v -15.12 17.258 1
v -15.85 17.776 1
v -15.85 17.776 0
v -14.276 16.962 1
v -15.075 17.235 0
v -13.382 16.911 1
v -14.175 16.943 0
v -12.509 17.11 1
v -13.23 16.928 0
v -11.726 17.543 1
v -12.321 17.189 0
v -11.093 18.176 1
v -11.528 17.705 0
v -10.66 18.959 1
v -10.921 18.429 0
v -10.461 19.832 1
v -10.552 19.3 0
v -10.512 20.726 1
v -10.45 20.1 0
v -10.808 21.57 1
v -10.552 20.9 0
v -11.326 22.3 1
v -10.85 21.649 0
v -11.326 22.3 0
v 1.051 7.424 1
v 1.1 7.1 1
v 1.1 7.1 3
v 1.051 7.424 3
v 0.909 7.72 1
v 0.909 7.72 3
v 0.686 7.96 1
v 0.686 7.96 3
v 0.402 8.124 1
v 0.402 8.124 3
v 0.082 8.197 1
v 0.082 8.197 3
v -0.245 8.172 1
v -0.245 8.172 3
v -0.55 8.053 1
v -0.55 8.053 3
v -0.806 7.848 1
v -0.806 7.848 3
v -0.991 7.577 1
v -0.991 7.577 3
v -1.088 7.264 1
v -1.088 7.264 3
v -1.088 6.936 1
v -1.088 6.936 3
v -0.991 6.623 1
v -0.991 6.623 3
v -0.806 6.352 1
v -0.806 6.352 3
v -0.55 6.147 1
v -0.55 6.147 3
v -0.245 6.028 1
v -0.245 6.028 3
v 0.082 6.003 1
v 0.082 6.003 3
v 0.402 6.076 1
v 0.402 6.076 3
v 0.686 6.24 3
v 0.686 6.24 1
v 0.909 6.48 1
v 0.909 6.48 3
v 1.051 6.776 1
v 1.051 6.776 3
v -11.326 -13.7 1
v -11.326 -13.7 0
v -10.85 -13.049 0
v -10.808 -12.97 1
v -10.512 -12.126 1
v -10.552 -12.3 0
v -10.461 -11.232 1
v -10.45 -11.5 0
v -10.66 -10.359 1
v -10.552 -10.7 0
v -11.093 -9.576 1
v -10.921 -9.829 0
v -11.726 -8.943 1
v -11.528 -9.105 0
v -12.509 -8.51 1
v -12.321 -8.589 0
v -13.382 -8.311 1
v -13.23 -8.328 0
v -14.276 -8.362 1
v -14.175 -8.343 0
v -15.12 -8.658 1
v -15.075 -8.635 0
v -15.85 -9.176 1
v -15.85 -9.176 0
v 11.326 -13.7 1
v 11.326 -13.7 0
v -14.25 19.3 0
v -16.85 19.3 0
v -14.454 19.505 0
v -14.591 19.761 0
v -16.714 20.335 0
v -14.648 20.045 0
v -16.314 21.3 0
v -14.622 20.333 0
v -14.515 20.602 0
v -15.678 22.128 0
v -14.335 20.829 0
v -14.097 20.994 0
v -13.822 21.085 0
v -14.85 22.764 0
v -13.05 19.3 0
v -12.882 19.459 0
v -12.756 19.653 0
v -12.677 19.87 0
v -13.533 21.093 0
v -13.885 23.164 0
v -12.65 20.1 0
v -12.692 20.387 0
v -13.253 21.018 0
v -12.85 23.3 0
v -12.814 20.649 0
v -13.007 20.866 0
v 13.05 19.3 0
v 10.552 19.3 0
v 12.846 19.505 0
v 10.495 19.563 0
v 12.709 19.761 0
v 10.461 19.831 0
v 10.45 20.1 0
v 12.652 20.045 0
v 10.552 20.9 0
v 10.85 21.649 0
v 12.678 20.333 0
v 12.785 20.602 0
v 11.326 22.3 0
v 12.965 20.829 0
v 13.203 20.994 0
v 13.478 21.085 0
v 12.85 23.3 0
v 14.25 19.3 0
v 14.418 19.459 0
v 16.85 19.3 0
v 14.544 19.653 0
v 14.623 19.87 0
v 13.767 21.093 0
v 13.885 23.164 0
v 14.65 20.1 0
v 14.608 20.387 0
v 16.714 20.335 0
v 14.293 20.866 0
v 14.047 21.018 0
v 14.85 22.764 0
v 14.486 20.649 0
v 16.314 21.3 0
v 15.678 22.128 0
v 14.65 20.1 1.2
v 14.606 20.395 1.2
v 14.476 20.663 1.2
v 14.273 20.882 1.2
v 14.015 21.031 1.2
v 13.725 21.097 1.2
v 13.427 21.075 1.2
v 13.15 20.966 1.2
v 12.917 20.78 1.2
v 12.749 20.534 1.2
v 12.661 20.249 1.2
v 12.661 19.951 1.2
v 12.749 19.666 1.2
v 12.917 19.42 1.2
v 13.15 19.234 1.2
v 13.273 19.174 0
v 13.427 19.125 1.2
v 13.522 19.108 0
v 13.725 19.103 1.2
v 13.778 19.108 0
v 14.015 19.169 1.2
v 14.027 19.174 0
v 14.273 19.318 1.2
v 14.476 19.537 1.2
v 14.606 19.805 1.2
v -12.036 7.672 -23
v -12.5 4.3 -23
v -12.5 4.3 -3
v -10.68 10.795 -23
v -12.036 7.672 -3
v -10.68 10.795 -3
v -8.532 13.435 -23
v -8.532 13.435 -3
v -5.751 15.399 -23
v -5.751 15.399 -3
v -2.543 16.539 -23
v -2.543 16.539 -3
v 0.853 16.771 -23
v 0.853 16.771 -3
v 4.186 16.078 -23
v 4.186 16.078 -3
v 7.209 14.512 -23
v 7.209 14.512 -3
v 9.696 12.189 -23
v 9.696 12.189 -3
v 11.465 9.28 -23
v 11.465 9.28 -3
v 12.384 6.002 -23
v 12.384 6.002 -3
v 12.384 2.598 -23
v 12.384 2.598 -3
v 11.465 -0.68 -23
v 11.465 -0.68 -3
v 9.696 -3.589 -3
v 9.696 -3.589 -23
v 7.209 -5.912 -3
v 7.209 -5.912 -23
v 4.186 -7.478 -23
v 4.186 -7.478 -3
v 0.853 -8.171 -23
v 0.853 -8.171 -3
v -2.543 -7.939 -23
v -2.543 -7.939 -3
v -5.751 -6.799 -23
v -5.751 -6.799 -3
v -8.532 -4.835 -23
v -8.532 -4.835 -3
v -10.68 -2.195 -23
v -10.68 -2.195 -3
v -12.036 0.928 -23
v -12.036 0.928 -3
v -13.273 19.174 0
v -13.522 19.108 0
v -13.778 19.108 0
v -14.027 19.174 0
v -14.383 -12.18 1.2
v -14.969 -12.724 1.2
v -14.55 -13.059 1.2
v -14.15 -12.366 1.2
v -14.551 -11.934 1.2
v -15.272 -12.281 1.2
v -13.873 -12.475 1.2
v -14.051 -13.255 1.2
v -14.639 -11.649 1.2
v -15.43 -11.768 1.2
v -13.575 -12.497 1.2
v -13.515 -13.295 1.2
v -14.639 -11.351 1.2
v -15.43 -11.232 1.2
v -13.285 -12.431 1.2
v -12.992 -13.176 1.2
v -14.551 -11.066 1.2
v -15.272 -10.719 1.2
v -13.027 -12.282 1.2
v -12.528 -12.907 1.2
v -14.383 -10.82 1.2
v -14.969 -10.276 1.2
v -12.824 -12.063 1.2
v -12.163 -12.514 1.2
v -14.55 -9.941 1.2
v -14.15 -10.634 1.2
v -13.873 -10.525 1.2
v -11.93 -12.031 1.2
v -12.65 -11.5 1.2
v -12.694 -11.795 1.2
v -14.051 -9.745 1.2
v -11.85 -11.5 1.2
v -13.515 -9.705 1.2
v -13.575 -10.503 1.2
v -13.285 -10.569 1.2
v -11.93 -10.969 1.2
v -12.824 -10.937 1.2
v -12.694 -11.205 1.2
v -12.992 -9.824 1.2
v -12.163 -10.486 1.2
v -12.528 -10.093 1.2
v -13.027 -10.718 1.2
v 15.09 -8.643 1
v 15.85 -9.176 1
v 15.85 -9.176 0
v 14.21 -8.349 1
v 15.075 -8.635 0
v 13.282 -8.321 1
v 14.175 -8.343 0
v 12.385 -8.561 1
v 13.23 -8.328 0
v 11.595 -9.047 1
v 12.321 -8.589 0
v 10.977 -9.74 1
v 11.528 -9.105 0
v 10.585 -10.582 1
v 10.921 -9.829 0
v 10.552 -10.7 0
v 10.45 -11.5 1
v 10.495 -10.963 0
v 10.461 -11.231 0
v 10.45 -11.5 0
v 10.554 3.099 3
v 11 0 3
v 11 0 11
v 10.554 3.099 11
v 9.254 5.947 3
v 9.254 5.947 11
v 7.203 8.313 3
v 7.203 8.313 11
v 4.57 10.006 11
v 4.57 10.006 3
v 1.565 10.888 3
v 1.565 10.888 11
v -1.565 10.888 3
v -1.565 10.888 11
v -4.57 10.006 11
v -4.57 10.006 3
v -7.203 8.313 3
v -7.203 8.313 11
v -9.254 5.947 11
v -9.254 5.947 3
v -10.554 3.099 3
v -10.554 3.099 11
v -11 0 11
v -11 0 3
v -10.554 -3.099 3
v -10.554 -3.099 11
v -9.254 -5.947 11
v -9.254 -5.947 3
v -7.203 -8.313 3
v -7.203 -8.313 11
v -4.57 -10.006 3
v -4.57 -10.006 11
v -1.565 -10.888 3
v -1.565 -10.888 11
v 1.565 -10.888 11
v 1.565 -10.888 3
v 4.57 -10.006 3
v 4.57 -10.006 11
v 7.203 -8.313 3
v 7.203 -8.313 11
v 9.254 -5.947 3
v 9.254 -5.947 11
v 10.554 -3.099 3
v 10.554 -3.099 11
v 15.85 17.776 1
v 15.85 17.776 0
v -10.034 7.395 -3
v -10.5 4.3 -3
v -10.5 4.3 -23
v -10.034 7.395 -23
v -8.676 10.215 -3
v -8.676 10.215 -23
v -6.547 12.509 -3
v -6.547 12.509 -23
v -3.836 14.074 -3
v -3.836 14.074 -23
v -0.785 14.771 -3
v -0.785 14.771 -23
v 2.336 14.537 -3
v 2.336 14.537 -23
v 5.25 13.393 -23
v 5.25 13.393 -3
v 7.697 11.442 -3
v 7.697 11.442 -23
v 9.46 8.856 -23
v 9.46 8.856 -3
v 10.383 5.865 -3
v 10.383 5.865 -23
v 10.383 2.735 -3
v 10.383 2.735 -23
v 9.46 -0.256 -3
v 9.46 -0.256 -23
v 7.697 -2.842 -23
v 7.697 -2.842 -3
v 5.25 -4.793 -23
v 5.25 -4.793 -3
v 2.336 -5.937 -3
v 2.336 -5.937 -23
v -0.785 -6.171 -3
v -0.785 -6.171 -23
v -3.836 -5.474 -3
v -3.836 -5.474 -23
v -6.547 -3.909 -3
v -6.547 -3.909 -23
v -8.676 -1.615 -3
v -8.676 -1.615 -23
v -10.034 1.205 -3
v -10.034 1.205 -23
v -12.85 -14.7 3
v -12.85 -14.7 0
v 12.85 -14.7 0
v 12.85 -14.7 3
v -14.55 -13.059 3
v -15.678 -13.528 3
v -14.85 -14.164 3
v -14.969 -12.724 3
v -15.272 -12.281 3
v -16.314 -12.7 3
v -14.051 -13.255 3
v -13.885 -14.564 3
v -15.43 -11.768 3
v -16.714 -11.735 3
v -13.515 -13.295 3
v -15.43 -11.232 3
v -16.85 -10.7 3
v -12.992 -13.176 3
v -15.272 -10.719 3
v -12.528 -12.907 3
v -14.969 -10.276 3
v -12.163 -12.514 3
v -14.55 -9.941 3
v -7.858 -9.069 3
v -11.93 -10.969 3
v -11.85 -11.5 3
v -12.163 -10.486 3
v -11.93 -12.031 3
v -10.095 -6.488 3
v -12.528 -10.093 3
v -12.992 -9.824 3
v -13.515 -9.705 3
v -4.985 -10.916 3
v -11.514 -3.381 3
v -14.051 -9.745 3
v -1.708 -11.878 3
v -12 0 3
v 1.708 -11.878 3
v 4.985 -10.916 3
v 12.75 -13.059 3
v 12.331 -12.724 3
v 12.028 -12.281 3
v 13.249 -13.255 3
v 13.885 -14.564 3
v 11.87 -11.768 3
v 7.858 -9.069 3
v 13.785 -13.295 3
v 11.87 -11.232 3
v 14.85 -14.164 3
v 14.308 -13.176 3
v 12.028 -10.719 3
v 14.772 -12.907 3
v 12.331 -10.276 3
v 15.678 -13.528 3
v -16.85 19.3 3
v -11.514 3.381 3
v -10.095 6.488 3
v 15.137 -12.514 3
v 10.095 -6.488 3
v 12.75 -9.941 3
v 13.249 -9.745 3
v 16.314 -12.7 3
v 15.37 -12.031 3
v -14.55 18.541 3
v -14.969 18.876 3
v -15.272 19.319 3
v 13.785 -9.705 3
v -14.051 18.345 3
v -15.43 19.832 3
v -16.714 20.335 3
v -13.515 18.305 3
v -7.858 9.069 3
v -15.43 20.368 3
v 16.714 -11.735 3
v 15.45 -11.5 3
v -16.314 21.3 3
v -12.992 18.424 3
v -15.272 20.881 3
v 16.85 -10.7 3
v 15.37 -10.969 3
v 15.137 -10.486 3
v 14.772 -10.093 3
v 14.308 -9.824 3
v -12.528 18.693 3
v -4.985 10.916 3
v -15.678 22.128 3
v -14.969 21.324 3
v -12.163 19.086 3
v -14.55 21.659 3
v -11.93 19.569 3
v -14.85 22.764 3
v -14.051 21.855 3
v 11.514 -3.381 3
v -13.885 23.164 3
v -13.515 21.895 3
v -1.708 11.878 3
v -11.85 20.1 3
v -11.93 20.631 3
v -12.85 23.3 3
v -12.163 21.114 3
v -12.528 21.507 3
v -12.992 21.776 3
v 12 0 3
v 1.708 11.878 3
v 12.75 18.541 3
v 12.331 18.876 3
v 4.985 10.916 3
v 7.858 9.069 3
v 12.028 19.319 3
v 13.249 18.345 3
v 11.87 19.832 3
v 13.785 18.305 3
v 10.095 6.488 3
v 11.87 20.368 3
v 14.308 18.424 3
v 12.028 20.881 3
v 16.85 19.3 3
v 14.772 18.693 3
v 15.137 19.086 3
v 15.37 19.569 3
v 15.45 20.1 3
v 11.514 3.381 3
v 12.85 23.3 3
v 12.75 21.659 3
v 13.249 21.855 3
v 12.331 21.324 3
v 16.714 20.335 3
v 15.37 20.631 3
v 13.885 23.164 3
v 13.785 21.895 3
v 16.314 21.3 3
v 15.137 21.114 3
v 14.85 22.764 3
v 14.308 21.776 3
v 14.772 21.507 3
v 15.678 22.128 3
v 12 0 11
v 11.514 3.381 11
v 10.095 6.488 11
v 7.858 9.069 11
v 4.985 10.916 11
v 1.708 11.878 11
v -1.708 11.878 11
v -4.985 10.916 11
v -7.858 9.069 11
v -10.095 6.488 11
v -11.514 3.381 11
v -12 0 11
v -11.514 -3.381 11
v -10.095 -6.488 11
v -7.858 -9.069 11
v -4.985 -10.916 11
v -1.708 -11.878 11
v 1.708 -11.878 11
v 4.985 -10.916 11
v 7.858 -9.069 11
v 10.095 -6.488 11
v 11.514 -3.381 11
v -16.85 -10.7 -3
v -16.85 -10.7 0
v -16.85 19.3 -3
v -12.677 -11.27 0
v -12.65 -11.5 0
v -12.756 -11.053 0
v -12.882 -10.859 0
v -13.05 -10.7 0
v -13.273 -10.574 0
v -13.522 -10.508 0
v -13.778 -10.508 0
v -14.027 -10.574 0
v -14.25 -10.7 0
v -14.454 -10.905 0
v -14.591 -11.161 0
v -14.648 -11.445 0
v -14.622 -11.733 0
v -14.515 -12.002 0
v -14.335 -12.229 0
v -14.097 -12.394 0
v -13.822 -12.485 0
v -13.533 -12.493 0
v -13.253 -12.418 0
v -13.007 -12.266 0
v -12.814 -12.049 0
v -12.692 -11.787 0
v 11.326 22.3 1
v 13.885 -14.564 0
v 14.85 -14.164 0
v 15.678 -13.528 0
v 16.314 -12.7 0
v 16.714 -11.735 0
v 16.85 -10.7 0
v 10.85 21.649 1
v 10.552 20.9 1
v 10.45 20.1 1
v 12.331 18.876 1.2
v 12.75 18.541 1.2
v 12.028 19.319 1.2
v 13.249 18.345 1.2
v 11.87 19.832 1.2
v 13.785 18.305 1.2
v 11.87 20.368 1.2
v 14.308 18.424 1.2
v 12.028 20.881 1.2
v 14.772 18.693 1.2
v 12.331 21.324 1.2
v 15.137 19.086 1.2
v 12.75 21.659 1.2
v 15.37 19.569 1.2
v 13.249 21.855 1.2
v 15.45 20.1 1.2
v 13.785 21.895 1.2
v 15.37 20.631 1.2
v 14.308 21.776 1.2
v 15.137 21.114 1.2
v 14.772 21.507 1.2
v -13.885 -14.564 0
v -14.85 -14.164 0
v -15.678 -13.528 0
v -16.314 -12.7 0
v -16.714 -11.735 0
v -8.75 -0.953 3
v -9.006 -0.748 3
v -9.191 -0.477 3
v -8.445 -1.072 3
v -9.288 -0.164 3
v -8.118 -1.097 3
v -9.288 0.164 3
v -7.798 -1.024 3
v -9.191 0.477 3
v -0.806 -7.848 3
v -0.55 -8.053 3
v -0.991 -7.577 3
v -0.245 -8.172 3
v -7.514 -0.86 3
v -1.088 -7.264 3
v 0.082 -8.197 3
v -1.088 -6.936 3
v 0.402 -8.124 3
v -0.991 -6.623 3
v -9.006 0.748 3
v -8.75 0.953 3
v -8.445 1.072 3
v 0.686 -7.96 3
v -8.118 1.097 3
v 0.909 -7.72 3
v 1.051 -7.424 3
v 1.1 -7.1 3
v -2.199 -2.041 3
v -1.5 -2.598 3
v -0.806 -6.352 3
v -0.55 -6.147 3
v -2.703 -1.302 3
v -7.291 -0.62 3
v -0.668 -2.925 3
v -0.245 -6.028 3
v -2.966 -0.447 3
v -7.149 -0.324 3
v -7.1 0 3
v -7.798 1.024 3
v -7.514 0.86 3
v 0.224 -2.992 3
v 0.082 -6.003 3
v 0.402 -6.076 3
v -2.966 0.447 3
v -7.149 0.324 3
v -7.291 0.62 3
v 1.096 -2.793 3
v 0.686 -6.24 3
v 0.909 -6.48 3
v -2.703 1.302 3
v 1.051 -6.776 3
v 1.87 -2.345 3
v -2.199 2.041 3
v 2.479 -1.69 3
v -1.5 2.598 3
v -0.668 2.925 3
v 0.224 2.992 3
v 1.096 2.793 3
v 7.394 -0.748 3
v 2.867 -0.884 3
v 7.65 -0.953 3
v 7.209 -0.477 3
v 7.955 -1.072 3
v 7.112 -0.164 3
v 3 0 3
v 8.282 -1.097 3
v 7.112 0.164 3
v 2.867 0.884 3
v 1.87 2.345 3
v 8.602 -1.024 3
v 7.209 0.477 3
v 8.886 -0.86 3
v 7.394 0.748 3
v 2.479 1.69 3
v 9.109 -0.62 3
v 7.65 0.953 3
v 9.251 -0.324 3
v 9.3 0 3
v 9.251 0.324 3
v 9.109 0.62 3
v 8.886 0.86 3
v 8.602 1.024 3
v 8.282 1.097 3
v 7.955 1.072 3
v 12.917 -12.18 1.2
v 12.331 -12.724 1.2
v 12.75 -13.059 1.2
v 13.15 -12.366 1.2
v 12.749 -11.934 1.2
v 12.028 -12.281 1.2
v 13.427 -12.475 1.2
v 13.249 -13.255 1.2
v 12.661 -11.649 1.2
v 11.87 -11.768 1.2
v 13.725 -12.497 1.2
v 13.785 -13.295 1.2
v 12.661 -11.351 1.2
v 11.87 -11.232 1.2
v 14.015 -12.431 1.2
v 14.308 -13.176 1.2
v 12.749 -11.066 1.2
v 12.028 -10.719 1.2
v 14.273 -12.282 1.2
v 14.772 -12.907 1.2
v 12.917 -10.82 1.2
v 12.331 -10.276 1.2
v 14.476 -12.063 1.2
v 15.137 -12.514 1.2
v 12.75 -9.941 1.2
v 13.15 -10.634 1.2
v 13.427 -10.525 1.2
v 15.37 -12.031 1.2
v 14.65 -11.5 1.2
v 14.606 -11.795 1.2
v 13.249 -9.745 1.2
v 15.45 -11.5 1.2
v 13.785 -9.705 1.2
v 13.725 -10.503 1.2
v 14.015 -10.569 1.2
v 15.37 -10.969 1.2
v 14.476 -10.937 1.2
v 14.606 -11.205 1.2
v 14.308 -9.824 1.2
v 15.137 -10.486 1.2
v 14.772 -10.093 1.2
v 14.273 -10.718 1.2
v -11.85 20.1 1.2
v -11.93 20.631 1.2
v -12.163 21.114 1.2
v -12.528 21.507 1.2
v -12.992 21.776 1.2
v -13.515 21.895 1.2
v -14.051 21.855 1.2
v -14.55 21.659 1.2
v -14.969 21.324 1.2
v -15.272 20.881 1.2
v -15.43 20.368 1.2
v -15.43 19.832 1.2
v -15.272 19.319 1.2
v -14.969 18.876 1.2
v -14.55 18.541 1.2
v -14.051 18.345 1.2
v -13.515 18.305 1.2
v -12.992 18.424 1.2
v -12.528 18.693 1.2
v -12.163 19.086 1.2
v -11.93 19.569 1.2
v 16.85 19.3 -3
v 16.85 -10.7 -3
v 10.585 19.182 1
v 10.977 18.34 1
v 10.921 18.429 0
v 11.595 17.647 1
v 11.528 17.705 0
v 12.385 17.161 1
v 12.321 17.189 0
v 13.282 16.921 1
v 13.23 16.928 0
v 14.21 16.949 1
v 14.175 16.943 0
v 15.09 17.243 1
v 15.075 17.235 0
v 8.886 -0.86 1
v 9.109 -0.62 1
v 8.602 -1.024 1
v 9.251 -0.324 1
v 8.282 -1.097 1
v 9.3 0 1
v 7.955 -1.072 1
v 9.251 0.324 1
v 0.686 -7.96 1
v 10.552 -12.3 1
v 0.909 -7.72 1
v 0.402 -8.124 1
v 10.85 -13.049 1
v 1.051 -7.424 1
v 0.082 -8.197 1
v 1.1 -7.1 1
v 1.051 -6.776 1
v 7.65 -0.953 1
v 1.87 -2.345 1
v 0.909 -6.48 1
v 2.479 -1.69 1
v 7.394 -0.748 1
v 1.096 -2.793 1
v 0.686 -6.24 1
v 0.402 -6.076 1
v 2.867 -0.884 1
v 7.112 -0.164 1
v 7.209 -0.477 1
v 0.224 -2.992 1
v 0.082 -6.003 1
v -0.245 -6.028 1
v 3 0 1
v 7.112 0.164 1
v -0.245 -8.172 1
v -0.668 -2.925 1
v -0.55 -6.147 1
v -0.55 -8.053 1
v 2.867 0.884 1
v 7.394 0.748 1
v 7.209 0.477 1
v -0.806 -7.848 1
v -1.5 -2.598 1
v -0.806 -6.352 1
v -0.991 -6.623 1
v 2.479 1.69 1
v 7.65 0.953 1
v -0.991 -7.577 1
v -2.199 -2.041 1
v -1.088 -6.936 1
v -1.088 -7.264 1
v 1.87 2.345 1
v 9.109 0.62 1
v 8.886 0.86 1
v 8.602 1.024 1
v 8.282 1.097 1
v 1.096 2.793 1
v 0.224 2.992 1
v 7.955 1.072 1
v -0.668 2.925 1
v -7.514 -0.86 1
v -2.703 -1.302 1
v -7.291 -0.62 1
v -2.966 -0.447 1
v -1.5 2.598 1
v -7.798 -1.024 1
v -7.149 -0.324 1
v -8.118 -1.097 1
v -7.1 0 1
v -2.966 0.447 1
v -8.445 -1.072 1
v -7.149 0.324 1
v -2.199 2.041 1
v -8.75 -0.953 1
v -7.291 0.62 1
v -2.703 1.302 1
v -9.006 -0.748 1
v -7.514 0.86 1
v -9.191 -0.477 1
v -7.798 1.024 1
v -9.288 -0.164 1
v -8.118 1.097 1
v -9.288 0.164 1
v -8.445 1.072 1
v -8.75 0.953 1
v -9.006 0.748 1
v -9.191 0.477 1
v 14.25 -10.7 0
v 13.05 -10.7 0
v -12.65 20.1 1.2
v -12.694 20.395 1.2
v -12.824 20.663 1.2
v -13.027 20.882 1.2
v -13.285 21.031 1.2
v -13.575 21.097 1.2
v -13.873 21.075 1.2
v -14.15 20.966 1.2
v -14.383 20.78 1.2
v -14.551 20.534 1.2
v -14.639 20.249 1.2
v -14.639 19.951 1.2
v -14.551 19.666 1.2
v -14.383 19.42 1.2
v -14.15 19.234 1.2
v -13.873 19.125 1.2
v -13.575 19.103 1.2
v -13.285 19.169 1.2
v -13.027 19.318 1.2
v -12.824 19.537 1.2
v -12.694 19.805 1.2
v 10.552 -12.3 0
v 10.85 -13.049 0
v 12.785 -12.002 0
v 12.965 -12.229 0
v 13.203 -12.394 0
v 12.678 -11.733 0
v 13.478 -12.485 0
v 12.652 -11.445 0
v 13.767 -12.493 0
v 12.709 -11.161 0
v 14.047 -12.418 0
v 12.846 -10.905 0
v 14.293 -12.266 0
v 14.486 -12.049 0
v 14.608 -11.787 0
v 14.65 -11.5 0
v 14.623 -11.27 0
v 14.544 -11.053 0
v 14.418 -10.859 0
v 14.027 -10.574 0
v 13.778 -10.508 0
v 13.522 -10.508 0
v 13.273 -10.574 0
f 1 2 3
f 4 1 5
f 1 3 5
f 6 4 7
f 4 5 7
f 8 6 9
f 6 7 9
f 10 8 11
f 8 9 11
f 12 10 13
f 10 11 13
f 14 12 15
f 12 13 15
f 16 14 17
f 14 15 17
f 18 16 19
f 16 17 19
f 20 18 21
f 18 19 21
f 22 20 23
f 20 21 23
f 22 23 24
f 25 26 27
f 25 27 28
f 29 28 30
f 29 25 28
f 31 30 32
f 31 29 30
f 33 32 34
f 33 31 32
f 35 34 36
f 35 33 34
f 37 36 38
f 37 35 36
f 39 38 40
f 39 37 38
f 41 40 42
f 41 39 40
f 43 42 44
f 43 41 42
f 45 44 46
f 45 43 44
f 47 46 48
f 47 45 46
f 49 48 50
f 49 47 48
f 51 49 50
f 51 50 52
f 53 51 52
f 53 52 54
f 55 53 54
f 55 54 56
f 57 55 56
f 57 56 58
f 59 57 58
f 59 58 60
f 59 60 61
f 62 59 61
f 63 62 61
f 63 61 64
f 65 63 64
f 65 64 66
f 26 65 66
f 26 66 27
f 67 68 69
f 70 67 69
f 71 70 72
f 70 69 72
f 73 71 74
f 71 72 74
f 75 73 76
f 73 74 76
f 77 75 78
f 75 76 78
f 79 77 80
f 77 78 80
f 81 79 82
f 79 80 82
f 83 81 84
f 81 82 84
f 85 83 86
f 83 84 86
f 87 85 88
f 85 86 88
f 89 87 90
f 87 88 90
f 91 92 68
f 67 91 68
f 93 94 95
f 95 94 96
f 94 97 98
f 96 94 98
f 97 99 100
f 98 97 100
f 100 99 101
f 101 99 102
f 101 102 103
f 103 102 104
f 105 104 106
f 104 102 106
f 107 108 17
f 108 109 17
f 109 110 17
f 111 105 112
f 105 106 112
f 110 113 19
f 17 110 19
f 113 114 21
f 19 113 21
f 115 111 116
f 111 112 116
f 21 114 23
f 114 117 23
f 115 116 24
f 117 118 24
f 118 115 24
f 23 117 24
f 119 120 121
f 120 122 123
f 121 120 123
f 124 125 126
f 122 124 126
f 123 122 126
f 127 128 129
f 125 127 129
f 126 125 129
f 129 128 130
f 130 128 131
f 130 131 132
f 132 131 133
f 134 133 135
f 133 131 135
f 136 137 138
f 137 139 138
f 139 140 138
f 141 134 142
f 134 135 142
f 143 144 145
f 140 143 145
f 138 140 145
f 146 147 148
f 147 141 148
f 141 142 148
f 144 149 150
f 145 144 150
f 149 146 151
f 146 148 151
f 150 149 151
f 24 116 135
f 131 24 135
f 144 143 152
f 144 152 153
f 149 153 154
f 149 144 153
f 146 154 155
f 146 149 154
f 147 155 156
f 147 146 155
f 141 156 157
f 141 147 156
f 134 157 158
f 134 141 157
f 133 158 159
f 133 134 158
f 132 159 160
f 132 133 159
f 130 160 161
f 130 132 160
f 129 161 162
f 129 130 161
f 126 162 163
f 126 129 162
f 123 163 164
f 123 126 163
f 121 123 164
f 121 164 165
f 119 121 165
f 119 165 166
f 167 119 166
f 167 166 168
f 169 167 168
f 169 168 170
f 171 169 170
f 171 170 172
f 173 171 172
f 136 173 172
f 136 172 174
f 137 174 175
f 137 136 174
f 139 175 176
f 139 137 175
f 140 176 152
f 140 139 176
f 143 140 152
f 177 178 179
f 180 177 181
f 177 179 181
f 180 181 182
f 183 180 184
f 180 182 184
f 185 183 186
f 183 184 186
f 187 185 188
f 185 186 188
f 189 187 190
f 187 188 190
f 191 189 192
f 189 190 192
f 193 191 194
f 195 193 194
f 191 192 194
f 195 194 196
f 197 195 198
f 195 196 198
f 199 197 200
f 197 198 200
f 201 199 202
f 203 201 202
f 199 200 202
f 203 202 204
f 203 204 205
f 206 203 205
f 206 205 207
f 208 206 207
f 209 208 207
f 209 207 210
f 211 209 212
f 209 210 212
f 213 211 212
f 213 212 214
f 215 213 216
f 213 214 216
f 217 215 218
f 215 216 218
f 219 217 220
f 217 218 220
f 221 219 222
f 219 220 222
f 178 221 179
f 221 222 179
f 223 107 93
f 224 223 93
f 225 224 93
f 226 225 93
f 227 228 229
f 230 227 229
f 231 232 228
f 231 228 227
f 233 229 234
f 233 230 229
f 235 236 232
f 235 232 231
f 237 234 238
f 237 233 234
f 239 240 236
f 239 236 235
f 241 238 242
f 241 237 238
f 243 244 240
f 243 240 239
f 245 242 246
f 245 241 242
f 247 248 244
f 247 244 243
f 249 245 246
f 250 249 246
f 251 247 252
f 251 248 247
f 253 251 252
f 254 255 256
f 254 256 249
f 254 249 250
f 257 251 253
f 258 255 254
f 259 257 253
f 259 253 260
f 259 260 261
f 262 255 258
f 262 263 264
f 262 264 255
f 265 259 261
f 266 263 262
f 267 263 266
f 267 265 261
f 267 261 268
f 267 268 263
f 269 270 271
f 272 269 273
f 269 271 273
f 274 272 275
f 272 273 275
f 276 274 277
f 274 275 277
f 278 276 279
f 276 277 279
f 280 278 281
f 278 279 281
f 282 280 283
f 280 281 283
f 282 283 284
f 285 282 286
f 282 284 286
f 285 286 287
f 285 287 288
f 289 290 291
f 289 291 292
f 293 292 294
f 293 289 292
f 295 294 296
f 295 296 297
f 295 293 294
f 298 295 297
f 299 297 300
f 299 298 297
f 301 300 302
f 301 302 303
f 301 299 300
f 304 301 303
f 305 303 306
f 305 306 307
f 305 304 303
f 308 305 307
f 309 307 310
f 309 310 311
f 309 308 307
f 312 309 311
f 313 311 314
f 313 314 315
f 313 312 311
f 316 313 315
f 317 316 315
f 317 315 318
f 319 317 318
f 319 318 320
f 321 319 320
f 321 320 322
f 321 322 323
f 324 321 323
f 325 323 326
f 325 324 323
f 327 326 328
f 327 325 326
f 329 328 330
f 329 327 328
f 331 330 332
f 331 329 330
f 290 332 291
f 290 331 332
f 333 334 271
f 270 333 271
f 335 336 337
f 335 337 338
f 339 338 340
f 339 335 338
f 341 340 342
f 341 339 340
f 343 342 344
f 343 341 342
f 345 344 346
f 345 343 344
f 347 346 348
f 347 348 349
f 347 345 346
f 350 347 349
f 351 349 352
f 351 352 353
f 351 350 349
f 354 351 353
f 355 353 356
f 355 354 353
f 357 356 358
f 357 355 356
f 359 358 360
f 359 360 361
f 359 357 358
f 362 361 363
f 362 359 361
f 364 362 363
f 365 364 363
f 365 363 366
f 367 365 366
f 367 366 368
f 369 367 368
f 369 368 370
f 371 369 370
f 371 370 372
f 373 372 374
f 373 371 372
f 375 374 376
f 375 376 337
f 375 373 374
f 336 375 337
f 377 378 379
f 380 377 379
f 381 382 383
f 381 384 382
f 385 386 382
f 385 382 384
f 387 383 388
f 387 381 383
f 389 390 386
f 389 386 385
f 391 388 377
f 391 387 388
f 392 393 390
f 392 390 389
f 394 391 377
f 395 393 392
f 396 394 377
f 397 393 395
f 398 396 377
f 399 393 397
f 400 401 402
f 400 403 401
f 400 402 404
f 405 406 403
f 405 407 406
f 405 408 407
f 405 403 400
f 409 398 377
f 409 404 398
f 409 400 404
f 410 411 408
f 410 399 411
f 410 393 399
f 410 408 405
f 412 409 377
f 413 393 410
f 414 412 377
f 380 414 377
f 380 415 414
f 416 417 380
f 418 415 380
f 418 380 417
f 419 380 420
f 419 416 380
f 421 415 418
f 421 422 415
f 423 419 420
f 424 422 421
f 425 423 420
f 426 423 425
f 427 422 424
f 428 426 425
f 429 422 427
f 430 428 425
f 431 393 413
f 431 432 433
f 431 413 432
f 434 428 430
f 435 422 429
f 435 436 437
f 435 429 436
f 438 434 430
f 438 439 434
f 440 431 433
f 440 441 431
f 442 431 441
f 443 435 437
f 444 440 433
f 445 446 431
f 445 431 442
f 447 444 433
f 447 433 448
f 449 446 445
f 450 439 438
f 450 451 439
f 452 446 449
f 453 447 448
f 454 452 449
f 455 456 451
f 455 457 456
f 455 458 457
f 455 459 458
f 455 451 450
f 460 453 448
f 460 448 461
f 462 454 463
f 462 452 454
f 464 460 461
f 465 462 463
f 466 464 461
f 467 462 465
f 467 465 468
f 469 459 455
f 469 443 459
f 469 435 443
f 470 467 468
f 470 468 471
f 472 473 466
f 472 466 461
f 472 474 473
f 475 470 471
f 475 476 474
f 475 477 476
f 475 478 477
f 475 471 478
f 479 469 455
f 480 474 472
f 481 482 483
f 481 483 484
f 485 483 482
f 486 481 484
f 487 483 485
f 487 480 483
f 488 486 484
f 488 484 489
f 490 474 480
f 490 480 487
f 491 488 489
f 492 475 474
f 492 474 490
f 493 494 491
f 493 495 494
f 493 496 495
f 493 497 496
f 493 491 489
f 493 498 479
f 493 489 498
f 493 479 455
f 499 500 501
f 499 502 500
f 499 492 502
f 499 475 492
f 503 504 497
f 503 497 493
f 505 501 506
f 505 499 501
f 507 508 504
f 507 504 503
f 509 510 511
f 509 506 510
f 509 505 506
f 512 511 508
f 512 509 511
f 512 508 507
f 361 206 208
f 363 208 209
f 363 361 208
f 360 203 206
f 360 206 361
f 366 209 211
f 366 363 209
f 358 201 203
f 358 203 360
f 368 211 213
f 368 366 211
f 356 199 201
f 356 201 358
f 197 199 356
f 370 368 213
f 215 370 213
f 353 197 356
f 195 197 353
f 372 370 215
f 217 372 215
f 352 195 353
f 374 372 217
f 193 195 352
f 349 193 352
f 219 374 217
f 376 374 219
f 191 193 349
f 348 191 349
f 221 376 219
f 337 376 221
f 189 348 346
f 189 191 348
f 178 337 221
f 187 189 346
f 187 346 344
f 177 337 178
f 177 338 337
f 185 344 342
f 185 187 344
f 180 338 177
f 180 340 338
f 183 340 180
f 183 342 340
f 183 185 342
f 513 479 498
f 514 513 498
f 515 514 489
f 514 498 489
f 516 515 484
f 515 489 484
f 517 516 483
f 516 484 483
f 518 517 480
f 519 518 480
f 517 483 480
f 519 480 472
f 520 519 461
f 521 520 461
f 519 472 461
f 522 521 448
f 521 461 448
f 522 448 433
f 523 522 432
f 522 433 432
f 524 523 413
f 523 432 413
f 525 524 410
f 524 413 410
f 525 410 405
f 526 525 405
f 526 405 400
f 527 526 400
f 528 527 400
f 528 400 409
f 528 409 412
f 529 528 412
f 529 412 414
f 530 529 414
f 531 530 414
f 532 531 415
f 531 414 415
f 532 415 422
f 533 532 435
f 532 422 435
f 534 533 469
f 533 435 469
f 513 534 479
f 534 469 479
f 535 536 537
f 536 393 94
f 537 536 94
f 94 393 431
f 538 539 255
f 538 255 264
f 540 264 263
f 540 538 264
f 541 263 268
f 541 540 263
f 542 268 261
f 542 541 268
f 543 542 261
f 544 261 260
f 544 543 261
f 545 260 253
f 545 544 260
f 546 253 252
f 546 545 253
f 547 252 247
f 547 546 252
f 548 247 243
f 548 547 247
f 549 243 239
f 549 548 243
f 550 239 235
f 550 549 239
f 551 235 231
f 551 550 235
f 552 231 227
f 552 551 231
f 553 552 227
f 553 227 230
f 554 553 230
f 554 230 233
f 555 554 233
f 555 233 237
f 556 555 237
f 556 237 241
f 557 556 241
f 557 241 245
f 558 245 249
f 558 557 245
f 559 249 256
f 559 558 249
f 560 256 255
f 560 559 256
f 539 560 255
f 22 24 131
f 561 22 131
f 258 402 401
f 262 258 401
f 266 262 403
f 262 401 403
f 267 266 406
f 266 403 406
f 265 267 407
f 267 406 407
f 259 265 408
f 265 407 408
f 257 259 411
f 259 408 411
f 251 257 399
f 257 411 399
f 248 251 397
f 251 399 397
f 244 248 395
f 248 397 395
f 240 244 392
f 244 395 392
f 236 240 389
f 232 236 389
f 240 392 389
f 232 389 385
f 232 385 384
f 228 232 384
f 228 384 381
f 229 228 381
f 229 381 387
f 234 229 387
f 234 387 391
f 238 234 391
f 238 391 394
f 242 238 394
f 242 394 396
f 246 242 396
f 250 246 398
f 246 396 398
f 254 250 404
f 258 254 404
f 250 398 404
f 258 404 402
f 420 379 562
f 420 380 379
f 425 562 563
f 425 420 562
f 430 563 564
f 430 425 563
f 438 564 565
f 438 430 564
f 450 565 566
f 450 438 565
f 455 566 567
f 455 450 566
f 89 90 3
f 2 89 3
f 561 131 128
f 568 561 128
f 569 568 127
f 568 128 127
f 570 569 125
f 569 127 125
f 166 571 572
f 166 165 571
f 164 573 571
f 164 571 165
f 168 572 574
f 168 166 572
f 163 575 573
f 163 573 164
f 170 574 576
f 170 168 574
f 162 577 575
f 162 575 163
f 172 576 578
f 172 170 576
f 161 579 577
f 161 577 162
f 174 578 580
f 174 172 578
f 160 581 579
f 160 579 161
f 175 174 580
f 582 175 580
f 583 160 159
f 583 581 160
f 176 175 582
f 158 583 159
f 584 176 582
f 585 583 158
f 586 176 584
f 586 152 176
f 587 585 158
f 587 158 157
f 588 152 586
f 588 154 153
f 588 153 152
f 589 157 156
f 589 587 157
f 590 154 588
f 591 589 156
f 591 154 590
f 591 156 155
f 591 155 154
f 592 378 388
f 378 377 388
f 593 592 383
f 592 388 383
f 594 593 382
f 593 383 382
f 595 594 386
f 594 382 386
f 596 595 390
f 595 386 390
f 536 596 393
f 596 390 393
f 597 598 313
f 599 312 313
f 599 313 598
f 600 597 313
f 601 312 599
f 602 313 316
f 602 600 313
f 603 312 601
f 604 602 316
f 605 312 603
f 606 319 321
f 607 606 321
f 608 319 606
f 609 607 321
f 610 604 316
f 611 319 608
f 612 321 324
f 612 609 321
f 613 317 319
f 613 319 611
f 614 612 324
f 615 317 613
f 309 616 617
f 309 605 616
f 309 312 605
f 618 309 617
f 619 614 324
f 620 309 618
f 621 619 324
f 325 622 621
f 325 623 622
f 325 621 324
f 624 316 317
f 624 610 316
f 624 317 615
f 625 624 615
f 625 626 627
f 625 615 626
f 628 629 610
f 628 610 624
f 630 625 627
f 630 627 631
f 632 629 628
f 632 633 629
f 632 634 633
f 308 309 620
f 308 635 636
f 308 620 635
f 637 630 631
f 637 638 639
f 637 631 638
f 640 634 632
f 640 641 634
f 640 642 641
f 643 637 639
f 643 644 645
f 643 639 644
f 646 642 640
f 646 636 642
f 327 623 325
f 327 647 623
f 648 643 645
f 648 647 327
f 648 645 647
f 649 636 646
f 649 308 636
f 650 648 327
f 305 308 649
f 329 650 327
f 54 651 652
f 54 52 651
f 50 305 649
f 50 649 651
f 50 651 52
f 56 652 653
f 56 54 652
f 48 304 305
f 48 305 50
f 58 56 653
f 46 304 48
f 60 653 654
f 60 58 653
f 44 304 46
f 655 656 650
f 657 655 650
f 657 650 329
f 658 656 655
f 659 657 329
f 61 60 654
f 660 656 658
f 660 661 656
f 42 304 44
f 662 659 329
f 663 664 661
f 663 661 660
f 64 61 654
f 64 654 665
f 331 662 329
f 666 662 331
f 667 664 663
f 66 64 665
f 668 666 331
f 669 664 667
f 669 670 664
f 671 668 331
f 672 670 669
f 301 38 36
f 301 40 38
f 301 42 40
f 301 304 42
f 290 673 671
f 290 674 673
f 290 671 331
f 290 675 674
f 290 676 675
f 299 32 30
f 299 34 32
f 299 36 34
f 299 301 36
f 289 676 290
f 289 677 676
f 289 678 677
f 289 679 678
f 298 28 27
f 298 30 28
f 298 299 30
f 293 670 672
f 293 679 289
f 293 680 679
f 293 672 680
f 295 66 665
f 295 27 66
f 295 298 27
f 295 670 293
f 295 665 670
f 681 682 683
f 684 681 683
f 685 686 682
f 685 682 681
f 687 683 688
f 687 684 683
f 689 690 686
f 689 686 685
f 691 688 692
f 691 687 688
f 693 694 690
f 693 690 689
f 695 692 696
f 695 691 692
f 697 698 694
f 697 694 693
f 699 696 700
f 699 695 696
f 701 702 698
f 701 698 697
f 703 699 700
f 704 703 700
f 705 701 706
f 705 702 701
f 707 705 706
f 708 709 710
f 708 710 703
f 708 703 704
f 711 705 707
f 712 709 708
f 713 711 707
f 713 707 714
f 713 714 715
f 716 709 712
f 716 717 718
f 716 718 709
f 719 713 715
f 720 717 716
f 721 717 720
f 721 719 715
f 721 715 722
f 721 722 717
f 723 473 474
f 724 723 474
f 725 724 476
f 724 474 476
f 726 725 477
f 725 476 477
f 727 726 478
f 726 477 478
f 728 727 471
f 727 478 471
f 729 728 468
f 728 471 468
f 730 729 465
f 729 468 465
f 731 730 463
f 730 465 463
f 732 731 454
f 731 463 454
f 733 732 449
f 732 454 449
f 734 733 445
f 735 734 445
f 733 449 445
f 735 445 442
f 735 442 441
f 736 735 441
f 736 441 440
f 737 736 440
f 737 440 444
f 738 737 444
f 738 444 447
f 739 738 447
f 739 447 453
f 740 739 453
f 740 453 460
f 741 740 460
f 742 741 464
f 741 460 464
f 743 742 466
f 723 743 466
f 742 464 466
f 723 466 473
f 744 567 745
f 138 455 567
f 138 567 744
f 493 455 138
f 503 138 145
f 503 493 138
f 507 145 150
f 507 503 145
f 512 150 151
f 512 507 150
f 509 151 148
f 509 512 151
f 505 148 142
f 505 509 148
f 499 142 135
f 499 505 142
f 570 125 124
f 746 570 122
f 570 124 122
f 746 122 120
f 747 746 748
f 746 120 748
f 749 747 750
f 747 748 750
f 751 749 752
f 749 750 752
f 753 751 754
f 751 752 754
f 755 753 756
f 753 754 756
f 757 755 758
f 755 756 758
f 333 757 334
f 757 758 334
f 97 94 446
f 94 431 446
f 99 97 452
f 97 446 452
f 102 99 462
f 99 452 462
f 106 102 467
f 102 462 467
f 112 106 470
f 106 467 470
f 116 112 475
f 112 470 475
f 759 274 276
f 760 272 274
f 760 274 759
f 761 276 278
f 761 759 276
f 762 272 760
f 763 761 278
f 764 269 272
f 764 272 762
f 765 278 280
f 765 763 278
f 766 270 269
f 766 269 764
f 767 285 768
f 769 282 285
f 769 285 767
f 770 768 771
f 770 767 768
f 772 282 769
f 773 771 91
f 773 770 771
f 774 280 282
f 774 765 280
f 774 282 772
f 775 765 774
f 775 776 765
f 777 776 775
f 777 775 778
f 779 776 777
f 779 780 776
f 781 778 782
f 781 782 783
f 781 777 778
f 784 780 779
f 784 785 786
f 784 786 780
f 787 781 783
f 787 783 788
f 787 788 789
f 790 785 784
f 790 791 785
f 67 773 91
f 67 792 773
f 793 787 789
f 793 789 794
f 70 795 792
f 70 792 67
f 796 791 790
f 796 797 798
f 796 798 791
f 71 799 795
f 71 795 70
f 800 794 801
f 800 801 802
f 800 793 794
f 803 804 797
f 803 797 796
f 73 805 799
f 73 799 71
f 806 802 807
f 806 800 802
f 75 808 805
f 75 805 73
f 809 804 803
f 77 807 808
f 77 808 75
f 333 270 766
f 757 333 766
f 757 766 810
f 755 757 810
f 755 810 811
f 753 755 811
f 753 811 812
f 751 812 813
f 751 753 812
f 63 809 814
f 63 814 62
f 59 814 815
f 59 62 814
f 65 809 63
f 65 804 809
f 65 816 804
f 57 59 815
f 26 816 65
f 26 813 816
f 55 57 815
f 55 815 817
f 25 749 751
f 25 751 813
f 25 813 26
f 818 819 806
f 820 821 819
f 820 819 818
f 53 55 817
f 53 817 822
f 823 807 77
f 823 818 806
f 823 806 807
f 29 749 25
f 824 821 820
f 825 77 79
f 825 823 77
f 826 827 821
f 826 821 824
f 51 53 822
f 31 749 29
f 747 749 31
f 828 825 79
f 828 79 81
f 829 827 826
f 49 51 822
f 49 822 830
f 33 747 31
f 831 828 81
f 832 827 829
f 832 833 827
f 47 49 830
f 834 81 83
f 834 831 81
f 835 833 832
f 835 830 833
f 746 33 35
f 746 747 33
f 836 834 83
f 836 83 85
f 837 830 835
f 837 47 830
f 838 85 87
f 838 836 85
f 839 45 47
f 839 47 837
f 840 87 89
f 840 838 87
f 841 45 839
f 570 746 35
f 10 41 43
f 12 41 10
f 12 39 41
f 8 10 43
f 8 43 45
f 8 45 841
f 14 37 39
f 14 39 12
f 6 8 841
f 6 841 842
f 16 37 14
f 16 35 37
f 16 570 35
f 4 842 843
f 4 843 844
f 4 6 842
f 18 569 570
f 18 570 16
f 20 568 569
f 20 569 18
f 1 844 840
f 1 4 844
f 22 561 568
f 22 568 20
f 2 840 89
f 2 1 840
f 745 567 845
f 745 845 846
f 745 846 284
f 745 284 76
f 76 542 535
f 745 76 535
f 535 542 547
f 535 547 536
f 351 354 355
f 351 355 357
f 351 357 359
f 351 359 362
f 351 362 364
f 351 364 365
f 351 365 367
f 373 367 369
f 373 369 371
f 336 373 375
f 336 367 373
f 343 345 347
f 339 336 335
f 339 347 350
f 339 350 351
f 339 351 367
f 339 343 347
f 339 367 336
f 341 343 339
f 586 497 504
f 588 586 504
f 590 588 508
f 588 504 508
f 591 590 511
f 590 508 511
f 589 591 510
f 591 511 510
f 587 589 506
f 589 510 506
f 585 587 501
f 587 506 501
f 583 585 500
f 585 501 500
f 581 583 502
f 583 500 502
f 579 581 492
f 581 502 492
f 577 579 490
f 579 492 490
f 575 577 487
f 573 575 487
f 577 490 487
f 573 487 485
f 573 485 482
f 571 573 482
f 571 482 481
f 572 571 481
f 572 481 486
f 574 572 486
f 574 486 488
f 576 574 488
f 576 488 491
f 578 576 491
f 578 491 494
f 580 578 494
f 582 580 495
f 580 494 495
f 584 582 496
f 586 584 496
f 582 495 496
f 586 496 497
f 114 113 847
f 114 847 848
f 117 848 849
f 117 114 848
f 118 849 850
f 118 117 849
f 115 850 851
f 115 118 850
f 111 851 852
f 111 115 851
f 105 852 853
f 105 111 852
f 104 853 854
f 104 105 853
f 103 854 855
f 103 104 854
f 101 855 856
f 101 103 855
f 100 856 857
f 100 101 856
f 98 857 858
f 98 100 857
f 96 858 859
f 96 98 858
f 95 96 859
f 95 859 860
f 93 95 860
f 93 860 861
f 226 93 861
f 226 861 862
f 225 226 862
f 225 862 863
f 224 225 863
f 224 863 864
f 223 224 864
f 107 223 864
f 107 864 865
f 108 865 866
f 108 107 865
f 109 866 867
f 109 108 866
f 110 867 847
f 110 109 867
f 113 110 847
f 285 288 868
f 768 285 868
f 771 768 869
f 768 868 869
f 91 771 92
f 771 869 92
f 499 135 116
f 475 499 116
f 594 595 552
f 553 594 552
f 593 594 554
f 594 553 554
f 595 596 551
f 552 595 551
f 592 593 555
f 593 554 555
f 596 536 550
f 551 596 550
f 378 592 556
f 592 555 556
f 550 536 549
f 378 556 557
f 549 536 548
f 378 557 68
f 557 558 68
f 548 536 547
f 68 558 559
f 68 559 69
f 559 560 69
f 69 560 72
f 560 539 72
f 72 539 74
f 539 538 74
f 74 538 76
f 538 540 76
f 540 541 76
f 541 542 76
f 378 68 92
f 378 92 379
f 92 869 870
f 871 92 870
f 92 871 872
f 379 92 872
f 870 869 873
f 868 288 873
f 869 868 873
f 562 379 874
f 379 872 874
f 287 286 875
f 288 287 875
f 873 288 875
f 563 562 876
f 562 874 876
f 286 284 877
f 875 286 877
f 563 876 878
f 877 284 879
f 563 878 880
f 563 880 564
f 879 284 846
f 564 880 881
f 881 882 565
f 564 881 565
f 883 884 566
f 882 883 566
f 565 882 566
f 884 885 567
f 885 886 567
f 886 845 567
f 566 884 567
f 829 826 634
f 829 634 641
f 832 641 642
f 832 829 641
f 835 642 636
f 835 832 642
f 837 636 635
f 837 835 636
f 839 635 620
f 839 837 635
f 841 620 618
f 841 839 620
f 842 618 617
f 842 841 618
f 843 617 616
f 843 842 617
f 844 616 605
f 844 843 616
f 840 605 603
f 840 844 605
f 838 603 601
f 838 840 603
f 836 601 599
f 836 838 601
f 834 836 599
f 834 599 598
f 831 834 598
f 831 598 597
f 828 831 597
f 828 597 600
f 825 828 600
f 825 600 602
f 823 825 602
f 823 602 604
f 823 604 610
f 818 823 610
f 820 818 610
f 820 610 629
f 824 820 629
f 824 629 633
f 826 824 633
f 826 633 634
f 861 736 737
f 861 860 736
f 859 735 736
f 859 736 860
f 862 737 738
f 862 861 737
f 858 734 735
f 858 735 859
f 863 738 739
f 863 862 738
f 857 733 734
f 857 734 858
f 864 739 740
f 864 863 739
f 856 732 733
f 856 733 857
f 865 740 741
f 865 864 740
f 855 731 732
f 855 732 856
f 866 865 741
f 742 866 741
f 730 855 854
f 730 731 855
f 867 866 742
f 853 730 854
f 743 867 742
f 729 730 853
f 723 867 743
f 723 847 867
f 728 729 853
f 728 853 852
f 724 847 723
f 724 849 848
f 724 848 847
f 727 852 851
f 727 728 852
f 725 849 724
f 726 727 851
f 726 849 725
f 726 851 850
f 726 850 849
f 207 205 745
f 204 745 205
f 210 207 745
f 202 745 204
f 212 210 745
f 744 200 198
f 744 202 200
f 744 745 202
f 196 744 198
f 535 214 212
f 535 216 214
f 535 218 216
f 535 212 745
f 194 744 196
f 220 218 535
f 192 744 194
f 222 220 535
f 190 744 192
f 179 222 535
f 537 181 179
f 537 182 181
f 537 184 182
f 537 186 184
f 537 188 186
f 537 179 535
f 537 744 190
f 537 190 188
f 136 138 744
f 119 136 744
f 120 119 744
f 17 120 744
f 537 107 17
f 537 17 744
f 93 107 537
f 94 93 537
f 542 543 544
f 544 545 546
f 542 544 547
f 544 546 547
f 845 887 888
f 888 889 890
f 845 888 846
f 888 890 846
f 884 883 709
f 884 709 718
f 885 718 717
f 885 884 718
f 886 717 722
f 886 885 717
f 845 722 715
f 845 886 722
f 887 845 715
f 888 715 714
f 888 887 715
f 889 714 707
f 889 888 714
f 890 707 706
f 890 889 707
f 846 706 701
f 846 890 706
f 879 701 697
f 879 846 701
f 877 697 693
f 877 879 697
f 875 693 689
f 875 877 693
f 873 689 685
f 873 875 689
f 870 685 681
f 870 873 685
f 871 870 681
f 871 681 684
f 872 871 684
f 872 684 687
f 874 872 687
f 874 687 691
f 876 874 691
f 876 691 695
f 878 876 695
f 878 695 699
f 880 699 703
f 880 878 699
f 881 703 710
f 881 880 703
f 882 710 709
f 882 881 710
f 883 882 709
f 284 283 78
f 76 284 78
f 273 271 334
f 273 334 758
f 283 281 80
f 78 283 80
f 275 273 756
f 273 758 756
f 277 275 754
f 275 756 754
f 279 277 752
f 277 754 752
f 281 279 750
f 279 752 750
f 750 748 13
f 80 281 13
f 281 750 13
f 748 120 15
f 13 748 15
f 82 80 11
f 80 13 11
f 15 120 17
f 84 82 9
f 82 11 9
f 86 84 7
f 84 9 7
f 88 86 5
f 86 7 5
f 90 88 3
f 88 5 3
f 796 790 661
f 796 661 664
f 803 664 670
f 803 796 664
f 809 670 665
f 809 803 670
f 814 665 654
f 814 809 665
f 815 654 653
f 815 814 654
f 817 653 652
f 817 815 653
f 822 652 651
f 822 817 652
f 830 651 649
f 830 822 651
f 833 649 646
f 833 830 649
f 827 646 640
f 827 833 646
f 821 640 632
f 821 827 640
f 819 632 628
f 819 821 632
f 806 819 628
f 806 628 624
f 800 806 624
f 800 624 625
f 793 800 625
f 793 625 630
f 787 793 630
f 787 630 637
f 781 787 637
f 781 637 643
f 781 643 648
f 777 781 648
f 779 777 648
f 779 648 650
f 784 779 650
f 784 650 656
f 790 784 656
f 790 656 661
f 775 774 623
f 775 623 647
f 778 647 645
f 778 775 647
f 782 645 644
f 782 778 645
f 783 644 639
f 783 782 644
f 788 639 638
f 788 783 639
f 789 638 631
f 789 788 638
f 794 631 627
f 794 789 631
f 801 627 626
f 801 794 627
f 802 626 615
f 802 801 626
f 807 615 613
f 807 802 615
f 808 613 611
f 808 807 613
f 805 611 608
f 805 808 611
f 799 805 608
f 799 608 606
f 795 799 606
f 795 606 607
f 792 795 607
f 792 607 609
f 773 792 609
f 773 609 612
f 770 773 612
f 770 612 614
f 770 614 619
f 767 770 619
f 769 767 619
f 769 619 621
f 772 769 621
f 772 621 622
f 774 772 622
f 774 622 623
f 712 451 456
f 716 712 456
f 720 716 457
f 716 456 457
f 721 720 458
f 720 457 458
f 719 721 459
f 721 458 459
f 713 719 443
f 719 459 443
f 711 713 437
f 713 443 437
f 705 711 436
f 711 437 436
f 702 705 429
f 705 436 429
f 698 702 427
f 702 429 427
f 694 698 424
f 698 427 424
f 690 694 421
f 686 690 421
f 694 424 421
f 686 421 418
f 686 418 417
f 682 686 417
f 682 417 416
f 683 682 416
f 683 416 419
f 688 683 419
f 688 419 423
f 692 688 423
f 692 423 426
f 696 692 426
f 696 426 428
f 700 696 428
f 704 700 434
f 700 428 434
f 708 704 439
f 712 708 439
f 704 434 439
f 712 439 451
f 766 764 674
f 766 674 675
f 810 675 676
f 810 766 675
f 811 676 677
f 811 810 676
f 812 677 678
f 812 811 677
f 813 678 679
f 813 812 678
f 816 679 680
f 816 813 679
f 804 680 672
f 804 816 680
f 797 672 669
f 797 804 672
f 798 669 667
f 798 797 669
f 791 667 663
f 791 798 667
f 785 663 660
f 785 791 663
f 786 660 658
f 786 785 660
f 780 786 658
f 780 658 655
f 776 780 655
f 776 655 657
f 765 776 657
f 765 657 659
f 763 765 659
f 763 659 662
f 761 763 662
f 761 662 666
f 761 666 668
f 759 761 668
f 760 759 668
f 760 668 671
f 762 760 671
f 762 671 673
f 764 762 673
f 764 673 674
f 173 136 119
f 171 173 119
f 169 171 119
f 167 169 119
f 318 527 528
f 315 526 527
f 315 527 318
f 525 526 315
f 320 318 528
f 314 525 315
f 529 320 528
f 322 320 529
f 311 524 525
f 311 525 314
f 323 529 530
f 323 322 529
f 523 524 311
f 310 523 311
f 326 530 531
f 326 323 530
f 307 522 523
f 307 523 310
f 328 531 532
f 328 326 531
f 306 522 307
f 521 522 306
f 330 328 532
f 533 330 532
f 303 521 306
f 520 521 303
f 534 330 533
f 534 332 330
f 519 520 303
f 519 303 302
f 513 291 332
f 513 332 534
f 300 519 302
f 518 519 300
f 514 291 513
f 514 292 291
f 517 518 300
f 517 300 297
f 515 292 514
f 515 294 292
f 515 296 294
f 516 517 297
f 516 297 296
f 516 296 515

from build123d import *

# Parameters (mm, degrees)
SZKIC1_R                    = 3
SZKIC1_R_2                  = 1.1
SZKIC1_R_3                  = 1
DODANIE_WYCI_GNI_CIE1_DEPTH = 3
SZKIC2_R                    = 12
SZKIC2_R_2                  = 11
DODANIE_WYCI_GNI_CIE2_DEPTH = 8
SZKIC3_R                    = 1.1
SZKIC3_R_2                  = 3
WYTNIJ_WYCI_GNI_CIE1_DEPTH  = 1
SZKIC4_R                    = 1.8
WYTNIJ_WYCI_GNI_CIE2_DEPTH  = 1.8
ZAOKR_GLENIE1_R             = 4
SKETCH1_W                   = 33.7
SKETCH1_H                   = 30
BOSS_EXTRUDE1_DEPTH         = 3
SKETCH2_R                   = 12.5
SKETCH2_R_2                 = 10.5
BOSS_EXTRUDE2_DEPTH         = 20


with BuildPart() as part:
    # Szkic1 → Dodanie-wyciągnięcie1 (new body)
    with BuildSketch(Plane.XY):
        Polygon((-16.85, 0), (-16.85, -14.7), (0, -14.7), (16.85, -14.7), (16.85, 23.3), (-16.85, 23.3), align=None)
        Circle(SZKIC1_R, mode=Mode.SUBTRACT)
        with Locations((-8.2, 0)):
            Circle(SZKIC1_R_2, mode=Mode.SUBTRACT)
        with Locations((8.2, 0)):
            Circle(SZKIC1_R_2, mode=Mode.SUBTRACT)
        with Locations((0, 7.1)):
            Circle(SZKIC1_R_2, mode=Mode.SUBTRACT)
        with Locations((0, -7.1)):
            Circle(SZKIC1_R_2, mode=Mode.SUBTRACT)
        with Locations((-13.65, 20.1)):
            Circle(SZKIC1_R_3, mode=Mode.SUBTRACT)
        with Locations((13.65, 20.1)):
            Circle(SZKIC1_R_3, mode=Mode.SUBTRACT)
        with Locations((13.65, -11.5)):
            Circle(SZKIC1_R_3, mode=Mode.SUBTRACT)
        with Locations((-13.65, -11.5)):
            Circle(SZKIC1_R_3, mode=Mode.SUBTRACT)
    extrude(amount=DODANIE_WYCI_GNI_CIE1_DEPTH)

    # Szkic2 → Dodanie-wyciągnięcie2 (add)
    with BuildSketch(Plane.XY.offset(3)):
        Circle(SZKIC2_R)
        Circle(SZKIC2_R_2, mode=Mode.SUBTRACT)
    extrude(amount=DODANIE_WYCI_GNI_CIE2_DEPTH)

    # Szkic3 → Wytnij-wyciągnięcie1 (cut)
    with BuildSketch(Plane(origin=(0, 0, 0), x_dir=(-1, 0, 0), z_dir=(0, 0, -1))):
        with BuildLine():
            Line((11.326209992, 22.3), (-11.326209992, 22.3))
            ThreePointArc((-11.326209992, 22.3), (-10.67711184, 21.284033778), (-10.45, 20.1))
            ThreePointArc((-10.45, 20.1), (-12.385088936, 17.160612309), (-15.85, 17.776209992))
            Line((-15.85, 17.776209992), (-15.85, -9.176209992))
            ThreePointArc((-15.85, -9.176209992), (-12.385088936, -8.560612309), (-10.45, -11.5))
            ThreePointArc((-10.45, -11.5), (-10.67711184, -12.684033778), (-11.326209992, -13.7))
            Line((-11.326209992, -13.7), (11.326209992, -13.7))
            ThreePointArc((11.326209992, -13.7), (11.3872583, -9.2372583), (15.85, -9.176209992))
            Line((15.85, -9.176209992), (15.85, 17.776209992))
            ThreePointArc((15.85, 17.776209992), (11.3872583, 17.8372583), (11.326209992, 22.3))
        make_face()
        with Locations((-8.2, 0)):
            Circle(SZKIC3_R, mode=Mode.SUBTRACT)
        with Locations((0, -7.1)):
            Circle(SZKIC3_R, mode=Mode.SUBTRACT)
        Circle(SZKIC3_R_2, mode=Mode.SUBTRACT)
        with Locations((8.2, 0)):
            Circle(SZKIC3_R, mode=Mode.SUBTRACT)
        with Locations((0, 7.1)):
            Circle(SZKIC3_R, mode=Mode.SUBTRACT)
    extrude(amount=-WYTNIJ_WYCI_GNI_CIE1_DEPTH, mode=Mode.SUBTRACT)

    # Szkic4 → Wytnij-wyciągnięcie2 (cut)
    with BuildSketch(Plane.XY.offset(3)):
        with Locations((-13.65, 20.1)):
            Circle(SZKIC4_R)
        with Locations((13.65, 20.1)):
            Circle(SZKIC4_R)
        with Locations((13.65, -11.5)):
            Circle(SZKIC4_R)
        with Locations((-13.65, -11.5)):
            Circle(SZKIC4_R)
    extrude(amount=-WYTNIJ_WYCI_GNI_CIE2_DEPTH, mode=Mode.SUBTRACT)

    # Zaokrąglenie1
    zaokr_glenie1_edges = [part.edges().sort_by_distance(p)[0] for p in [
        (-16.85, 23.3, 1.5),
        (16.85, 23.3, 1.5),
        (16.85, -14.7, 1.5),
        (-16.85, -14.7, 1.5),
    ]]
    fillet(zaokr_glenie1_edges, radius=ZAOKR_GLENIE1_R)

    # Sketch1 → Boss-Extrude1 (add)
    with BuildSketch(Plane(origin=(0, 0, 0), x_dir=(-1, 0, 0), z_dir=(0, 0, -1))):
        with Locations((0, 4.3)):
            Rectangle(SKETCH1_W, SKETCH1_H)
    extrude(amount=BOSS_EXTRUDE1_DEPTH)

    # Sketch2 → Boss-Extrude2 (add)
    with BuildSketch(Plane(origin=(0, 0, -3), x_dir=(-1, 0, 0), z_dir=(0, 0, -1))):
        with Locations((0, 4.3)):
            Circle(SKETCH2_R)
        with Locations((0, 4.3)):
            Circle(SKETCH2_R_2, mode=Mode.SUBTRACT)
    extrude(amount=BOSS_EXTRUDE2_DEPTH)


solid = part.part
